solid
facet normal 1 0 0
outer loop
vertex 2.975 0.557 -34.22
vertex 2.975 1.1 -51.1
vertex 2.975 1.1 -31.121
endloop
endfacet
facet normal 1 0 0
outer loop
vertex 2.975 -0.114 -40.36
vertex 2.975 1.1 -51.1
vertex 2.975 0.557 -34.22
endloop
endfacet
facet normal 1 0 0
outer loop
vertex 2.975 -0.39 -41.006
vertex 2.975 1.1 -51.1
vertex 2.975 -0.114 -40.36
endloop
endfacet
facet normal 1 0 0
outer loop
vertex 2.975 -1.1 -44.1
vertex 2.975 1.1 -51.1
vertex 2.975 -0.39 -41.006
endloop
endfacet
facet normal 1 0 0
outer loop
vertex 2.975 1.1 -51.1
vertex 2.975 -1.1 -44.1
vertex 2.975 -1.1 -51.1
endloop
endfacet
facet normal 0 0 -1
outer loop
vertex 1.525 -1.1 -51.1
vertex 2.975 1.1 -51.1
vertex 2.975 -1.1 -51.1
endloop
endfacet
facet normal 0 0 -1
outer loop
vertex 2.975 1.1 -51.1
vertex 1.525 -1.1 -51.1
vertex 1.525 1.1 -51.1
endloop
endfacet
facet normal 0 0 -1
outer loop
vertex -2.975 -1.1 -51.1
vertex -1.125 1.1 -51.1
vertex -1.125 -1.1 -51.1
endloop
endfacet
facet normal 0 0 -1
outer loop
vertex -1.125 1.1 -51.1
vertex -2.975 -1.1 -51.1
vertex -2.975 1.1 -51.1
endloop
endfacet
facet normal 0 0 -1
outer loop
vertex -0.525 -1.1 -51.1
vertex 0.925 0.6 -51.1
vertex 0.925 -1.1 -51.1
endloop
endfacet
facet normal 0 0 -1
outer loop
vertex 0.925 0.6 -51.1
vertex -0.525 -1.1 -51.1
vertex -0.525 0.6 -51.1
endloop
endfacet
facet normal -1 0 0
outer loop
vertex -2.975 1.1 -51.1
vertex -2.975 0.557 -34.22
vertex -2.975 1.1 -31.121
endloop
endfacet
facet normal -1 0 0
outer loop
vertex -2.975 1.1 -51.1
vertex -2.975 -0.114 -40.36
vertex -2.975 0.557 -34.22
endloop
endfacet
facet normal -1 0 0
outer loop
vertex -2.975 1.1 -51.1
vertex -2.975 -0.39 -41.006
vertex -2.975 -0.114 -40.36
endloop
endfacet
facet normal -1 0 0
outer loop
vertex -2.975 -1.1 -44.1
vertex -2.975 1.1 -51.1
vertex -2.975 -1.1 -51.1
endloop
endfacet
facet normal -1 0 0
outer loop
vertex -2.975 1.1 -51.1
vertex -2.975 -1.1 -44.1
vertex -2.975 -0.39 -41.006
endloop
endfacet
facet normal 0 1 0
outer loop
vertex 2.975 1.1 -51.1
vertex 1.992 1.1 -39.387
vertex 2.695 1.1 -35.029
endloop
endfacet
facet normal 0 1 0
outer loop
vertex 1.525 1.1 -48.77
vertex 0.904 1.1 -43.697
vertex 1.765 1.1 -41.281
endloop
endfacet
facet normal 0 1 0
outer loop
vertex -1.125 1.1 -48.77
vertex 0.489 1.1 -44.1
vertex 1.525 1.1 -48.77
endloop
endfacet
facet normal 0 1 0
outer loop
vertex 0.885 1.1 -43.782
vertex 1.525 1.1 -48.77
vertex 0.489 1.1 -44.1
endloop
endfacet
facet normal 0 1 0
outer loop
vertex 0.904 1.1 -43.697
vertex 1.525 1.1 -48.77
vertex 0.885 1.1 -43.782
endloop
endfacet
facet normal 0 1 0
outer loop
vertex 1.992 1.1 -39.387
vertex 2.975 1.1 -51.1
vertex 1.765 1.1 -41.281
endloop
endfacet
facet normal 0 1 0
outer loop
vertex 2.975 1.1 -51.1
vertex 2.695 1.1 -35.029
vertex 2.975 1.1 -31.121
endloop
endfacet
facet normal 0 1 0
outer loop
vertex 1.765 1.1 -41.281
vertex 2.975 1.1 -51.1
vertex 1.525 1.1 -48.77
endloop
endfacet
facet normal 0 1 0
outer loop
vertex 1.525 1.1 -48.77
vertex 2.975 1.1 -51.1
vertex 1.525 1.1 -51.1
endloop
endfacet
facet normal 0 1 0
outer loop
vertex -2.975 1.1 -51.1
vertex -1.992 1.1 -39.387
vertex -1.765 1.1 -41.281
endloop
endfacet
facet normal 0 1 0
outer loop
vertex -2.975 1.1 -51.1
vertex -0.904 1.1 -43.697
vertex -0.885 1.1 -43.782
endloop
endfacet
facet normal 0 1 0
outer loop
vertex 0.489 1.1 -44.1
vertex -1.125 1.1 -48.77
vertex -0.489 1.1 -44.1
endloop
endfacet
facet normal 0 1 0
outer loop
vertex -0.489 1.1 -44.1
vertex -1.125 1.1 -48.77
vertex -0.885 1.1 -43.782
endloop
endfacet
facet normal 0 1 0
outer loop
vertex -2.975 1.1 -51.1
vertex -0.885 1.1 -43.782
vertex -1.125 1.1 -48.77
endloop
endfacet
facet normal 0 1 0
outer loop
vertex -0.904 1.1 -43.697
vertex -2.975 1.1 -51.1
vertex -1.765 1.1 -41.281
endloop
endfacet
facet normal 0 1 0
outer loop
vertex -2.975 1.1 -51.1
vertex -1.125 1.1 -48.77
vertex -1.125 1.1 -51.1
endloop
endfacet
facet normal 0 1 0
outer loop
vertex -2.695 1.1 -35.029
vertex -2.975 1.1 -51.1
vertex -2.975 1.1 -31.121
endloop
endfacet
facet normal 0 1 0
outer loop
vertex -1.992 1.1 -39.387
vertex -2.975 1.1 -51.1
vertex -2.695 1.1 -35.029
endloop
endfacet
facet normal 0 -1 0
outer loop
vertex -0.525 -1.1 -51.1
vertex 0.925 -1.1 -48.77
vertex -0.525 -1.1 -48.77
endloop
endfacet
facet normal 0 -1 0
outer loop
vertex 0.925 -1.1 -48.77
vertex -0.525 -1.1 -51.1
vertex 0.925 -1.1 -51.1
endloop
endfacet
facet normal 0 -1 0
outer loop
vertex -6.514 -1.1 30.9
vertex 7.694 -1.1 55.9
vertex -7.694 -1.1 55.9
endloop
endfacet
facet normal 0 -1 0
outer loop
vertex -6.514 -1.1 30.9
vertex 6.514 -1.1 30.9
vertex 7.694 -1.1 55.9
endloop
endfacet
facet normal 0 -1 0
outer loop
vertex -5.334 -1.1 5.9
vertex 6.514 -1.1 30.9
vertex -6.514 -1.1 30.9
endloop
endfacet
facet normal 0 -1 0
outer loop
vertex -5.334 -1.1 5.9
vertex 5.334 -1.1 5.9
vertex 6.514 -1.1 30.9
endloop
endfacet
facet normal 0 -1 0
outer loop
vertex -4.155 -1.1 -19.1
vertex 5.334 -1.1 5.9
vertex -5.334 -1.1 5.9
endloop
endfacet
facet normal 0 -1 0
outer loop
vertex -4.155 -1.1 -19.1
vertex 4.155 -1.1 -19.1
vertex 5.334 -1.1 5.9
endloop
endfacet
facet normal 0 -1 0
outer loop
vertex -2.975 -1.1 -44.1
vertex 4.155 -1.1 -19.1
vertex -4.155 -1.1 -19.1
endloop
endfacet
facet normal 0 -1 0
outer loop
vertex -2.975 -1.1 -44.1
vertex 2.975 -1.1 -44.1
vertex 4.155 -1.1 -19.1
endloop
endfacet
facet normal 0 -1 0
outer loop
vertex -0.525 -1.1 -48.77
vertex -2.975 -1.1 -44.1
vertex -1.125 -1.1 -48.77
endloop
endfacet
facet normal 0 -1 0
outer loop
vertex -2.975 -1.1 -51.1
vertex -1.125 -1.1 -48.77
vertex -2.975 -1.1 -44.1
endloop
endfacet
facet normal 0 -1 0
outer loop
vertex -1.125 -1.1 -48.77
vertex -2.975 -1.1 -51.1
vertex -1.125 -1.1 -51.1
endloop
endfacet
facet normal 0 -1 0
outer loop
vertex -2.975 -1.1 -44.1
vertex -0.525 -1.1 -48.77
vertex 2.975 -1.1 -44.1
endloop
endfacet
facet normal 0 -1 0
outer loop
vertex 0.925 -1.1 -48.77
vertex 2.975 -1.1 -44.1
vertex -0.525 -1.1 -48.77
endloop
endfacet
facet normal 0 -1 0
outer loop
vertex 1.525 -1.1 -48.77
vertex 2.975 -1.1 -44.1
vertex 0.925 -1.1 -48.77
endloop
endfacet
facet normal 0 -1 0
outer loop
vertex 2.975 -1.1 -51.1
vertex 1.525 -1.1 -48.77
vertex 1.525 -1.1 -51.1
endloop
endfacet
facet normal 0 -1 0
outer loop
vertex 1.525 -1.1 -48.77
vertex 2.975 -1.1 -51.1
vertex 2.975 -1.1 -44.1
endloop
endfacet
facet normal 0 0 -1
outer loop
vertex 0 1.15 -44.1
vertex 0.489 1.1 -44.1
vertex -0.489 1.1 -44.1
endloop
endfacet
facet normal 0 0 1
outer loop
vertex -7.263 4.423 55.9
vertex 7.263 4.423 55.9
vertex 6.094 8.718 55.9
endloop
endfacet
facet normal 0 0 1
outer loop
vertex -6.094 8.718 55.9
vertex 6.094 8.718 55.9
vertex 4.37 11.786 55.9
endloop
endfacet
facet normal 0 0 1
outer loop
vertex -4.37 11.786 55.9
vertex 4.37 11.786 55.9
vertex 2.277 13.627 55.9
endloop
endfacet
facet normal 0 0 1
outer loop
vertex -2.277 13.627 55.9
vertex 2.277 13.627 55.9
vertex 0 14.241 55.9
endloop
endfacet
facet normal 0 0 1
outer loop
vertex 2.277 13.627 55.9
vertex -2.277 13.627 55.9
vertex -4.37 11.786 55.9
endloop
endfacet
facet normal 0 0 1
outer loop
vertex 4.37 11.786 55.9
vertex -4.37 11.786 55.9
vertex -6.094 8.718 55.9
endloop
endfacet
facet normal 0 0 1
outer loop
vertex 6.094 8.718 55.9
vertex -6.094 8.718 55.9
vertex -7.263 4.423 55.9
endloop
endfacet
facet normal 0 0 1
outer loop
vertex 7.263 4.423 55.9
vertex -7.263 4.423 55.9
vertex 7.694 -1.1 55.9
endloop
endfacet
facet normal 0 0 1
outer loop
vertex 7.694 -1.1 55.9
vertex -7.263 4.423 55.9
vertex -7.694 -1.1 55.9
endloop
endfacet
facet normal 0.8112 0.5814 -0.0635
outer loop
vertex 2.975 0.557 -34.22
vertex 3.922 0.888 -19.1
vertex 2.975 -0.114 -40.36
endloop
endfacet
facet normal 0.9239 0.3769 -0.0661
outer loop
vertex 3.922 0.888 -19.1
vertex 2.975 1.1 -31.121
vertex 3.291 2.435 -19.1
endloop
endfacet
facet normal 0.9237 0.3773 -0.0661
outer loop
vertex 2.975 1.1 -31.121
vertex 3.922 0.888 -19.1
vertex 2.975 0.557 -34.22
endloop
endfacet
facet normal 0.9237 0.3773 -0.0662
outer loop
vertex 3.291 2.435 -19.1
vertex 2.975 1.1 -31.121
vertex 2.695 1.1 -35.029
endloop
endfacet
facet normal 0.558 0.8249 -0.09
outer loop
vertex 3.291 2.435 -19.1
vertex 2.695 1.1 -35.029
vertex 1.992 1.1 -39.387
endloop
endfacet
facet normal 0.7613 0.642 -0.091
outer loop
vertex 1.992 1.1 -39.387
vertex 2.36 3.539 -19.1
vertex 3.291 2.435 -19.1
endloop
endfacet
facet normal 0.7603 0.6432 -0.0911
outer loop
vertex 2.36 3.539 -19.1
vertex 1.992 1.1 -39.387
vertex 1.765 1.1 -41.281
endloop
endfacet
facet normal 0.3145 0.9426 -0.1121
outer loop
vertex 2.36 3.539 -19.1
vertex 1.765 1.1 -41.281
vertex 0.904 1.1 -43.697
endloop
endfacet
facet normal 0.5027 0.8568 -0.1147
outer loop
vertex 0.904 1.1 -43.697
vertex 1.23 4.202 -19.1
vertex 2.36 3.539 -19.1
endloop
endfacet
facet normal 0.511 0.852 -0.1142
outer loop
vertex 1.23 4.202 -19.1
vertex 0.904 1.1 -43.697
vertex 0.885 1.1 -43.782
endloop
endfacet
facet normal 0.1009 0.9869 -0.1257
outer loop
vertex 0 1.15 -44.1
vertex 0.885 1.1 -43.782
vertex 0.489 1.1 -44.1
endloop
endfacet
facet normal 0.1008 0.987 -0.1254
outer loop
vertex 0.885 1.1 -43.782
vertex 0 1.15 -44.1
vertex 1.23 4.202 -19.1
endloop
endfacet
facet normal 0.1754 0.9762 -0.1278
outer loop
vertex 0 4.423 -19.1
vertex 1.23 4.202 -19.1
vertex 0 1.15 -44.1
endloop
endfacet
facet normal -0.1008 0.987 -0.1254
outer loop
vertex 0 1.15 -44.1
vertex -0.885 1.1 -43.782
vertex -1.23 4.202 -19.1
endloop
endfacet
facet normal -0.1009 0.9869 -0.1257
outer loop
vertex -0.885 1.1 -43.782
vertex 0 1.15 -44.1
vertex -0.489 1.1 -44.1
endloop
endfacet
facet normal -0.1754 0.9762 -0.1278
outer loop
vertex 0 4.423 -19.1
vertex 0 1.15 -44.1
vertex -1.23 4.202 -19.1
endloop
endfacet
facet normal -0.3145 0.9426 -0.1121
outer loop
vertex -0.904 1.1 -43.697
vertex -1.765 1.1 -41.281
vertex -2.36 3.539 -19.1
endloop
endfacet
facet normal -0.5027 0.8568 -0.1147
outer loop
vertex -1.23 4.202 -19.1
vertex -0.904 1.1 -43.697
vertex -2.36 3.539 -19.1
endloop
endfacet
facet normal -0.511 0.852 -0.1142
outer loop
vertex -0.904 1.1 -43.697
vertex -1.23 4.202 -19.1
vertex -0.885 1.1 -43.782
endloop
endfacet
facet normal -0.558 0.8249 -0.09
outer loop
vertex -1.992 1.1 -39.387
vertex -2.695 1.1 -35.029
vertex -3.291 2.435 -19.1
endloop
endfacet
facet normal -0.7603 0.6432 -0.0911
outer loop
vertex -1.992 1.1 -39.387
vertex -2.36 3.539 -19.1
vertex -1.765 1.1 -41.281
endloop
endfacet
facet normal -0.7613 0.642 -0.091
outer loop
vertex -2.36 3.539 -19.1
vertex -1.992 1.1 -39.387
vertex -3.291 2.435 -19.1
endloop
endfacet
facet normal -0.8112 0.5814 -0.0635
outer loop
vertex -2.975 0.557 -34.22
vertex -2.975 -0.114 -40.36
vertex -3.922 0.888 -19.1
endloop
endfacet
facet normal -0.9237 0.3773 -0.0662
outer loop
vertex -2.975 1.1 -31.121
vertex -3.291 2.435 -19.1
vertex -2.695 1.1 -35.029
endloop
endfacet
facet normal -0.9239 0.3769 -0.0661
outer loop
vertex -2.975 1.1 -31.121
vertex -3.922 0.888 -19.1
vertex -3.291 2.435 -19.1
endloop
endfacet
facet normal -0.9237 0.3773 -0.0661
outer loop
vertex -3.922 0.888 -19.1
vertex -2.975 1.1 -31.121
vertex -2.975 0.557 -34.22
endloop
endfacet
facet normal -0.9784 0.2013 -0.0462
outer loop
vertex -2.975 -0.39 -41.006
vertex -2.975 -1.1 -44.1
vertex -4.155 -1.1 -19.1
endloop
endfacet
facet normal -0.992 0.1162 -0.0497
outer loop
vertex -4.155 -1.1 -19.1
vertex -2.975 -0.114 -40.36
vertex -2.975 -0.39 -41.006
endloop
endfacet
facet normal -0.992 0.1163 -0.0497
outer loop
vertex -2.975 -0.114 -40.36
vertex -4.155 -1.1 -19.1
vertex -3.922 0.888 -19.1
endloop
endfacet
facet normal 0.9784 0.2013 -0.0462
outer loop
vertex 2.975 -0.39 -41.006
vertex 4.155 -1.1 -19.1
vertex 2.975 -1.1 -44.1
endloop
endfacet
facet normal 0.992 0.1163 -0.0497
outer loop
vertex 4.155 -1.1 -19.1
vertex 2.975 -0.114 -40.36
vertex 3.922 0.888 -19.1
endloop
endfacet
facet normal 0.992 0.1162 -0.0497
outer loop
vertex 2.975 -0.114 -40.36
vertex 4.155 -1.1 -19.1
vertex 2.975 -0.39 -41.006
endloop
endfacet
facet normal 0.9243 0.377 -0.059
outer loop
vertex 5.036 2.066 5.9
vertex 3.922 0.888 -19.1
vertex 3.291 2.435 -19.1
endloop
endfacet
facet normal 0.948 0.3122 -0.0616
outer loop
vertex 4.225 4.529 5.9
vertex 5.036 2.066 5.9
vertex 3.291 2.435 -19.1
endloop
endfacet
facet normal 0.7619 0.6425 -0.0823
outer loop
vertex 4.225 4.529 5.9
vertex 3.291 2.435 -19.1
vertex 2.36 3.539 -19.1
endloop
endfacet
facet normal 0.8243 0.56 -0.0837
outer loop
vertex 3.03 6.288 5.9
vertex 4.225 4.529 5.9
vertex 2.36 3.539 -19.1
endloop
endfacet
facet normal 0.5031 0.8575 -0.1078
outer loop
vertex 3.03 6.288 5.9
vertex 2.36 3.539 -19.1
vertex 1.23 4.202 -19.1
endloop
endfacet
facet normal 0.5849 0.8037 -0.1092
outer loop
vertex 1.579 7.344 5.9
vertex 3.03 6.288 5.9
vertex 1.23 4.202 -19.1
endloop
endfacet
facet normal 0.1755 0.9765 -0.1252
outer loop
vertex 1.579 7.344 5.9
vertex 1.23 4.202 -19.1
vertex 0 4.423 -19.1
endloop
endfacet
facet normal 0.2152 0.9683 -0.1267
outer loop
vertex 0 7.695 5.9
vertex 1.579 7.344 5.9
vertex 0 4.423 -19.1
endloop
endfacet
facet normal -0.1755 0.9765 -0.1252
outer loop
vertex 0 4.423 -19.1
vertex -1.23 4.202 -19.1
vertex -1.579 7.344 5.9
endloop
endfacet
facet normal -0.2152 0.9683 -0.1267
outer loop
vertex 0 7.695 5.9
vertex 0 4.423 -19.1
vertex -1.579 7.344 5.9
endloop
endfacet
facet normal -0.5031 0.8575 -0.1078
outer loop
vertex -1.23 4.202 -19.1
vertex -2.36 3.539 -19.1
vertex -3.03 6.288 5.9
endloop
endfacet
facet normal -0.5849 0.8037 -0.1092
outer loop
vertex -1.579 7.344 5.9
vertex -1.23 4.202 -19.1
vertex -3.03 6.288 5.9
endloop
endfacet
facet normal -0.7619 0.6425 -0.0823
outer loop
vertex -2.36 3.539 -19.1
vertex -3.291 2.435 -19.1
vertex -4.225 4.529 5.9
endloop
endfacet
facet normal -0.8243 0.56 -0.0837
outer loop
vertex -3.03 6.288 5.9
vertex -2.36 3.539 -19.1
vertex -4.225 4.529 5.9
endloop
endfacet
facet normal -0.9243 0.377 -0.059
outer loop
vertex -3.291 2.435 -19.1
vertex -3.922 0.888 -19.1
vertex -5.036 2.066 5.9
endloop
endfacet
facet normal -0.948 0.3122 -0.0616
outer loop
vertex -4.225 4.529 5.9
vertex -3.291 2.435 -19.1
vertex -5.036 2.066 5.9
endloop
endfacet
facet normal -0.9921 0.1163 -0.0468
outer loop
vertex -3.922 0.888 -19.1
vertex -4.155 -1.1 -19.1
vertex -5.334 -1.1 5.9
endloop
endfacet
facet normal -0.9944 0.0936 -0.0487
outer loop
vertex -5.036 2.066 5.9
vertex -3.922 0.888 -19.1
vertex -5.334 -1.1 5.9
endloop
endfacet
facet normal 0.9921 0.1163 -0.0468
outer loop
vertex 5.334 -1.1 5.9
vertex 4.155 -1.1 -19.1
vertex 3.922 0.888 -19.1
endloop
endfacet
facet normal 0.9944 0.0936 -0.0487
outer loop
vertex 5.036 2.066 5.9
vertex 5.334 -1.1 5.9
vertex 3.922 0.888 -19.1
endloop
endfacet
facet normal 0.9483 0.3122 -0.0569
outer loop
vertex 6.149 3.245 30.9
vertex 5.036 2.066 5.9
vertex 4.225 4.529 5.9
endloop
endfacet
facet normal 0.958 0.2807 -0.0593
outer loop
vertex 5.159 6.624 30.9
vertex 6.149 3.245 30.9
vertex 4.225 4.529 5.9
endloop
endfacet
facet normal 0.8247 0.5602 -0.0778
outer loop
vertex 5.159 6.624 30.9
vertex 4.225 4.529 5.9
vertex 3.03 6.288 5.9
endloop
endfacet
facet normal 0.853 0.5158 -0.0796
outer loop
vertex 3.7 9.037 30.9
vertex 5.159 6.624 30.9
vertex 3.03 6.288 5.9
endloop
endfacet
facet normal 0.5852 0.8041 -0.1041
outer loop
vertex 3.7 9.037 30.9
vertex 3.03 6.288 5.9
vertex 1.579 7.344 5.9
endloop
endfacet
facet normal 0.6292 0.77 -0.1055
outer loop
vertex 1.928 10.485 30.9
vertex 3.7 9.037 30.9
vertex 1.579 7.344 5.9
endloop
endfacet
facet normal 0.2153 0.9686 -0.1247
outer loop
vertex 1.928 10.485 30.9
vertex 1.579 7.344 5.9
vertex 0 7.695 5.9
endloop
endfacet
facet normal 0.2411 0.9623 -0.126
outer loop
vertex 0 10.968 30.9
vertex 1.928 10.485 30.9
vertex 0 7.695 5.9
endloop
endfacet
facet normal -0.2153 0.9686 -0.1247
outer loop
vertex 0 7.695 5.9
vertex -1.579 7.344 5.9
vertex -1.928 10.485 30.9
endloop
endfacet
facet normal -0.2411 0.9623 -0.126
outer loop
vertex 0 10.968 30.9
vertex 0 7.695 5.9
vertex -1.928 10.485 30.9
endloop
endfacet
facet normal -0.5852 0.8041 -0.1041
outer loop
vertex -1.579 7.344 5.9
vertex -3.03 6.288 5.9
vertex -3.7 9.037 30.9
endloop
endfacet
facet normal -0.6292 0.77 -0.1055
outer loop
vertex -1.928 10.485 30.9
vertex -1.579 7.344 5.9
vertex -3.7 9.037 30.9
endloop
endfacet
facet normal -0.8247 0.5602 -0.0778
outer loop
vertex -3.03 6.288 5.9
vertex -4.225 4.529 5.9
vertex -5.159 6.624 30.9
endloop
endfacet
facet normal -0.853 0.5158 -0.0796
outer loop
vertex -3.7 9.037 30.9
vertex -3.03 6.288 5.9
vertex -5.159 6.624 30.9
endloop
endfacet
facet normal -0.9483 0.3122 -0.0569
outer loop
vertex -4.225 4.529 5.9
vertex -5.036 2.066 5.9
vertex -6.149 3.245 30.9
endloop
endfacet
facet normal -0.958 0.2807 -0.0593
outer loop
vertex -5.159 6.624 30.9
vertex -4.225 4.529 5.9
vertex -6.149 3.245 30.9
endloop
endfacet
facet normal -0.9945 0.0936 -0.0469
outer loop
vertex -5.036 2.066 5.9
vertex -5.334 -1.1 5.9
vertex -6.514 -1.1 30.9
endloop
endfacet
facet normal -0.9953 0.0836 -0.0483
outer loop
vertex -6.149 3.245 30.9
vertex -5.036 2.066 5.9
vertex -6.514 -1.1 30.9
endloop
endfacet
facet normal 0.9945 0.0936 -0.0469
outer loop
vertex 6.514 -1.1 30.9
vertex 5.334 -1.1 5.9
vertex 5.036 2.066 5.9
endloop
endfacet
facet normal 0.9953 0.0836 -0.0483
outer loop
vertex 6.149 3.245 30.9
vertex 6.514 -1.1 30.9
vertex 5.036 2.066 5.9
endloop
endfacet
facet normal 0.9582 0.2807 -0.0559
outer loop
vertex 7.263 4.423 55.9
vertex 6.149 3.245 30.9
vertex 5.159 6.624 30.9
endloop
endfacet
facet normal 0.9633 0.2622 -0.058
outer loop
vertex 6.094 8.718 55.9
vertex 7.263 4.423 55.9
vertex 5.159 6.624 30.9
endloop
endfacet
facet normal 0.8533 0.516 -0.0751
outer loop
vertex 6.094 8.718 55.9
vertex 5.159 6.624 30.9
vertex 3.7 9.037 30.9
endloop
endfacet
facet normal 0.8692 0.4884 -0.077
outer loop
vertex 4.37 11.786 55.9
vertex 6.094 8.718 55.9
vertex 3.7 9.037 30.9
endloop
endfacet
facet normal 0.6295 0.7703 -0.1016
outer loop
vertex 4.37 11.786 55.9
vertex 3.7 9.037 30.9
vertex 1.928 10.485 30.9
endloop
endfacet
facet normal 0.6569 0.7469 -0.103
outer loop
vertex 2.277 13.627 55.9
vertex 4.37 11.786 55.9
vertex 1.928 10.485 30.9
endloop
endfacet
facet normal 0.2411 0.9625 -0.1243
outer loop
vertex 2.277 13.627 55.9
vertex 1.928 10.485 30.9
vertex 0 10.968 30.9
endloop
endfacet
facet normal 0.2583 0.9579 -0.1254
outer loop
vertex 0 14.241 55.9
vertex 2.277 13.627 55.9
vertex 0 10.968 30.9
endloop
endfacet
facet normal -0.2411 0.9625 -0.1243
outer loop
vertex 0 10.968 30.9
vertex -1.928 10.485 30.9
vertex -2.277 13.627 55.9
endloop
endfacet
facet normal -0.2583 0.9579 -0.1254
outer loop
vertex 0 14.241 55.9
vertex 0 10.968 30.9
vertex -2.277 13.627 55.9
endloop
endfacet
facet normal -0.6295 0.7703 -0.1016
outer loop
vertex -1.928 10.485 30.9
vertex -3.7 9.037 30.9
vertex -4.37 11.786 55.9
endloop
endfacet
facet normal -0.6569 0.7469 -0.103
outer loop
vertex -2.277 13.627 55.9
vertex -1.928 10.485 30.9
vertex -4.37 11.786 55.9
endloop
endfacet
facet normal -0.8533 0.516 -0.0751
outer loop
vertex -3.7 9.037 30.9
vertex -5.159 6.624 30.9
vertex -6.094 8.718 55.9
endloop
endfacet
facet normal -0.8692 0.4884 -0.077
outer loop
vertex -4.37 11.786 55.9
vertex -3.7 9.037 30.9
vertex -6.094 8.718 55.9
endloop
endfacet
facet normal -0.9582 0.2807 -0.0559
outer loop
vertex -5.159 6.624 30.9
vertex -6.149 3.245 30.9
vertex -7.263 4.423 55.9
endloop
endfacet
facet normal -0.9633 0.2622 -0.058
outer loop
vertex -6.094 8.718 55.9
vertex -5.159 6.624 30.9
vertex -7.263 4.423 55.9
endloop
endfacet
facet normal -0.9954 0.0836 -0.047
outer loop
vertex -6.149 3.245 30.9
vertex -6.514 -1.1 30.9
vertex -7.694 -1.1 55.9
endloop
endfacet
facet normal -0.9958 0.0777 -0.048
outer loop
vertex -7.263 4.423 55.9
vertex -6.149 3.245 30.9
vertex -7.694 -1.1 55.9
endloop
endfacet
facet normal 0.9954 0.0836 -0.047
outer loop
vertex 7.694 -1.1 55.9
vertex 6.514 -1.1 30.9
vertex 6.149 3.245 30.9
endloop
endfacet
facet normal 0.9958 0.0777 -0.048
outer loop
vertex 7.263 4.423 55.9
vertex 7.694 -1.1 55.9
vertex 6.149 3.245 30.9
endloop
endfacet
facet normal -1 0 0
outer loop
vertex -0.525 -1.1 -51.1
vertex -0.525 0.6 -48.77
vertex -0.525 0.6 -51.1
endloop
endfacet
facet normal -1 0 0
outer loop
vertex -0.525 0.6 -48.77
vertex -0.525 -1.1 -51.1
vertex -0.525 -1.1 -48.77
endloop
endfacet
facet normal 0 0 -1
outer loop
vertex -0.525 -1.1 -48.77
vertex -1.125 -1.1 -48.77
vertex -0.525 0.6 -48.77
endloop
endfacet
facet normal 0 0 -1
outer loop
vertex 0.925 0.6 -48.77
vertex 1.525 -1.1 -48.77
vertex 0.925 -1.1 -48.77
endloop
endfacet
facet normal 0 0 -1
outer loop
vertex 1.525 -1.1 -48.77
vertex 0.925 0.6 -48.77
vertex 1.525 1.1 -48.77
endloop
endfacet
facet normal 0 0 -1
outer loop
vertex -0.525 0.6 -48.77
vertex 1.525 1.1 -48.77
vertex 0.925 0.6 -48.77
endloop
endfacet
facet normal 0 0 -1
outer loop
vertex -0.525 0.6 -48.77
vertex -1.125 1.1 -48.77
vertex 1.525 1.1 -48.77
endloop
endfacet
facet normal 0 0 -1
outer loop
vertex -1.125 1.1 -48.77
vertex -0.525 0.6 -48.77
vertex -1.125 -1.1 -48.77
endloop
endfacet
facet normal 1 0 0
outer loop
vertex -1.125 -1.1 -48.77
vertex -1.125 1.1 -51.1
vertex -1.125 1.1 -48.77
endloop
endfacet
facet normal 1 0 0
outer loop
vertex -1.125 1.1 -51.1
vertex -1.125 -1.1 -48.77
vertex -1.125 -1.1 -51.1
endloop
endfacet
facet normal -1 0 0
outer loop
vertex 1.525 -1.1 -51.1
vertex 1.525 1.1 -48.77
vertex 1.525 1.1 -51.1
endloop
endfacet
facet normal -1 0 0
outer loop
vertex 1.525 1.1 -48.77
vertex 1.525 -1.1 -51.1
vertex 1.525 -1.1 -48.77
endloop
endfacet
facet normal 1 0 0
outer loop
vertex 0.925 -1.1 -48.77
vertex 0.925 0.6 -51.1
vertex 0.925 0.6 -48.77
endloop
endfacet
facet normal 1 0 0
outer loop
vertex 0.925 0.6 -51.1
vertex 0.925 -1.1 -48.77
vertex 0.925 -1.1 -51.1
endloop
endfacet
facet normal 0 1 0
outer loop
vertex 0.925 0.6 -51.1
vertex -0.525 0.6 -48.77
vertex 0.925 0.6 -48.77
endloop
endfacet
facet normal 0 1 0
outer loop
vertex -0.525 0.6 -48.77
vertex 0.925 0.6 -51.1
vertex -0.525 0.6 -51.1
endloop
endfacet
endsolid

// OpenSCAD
// Start: lazy_union
default_5_default_5();
// End: lazy_union

// Modules.

// 'PartMaterial undef-default - default 5.0'
module default_5_default_5() {
  // 'None : _combine_solids_and_holes'
  union() {
    // '_combine_solids_and_holes'
    difference() {
      // 'default : _combine_solids_and_holes'
      union() {
        // 'box'
        multmatrix(m=[[1.0, 0.0, 0.0, -2.975], [0.0, 1.0, 0.0, -1.1], [0.0, 0.0, 1.0, -51.1], [0.0, 0.0, 0.0, 1.0]]) {
          // 'box : _combine_solids_and_holes'
          union() {
            // 'box'
            cube(size=[5.95, 2.2, 102.2]);
          }
        }
        // 'handle'
        multmatrix(m=[[1.0, 0.0, 0.0, 0.0], [0.0, 1.0, 0.0, -1.1], [0.0, 0.0, 1.0, -44.1], [0.0, 0.0, 0.0, 1.0]]) {
          // 'handle : _combine_solids_and_holes'
          union() {
            // 'handle'
            linear_extrude(height=100.0, twist=0.0, slices=4, scale=[2.586206896551724, 6.8181818181818175]) {
              polygon(points=[[0.0, 0.0], [-0.7437499999999999, 0.0], [-1.4875, 0.0], [-2.23125, 0.0], [-2.975, 0.0], [-2.8084, 0.81], [-2.3562, 1.44], [-1.6897999999999997, 1.8899999999999997], [-0.8805999999999994, 2.1599999999999997], [4.440892098500626e-16, 2.25], [0.8806000000000003, 2.1599999999999997], [1.6898000000000004, 1.8900000000000006], [2.3562000000000016, 1.4399999999999986], [2.808400000000002, 0.8099999999999987], [2.975000000000001, 0.0], [2.23125, 0.0], [1.4875, 0.0], [0.74375, 0.0]]);
            }
          }
        }
      }
      // 'default'
      multmatrix(m=[[1.0, 0.0, 0.0, -1.125], [0.0, 1.0, 0.0, -1.1], [0.0, 0.0, 1.0, -51.1], [0.0, 0.0, 0.0, 1.0]]) {
        // ('slit', 0)
        color(c=[1.0, 0.0, 0.0, 0.3]) {
          // "('slit', 0) : _combine_solids_and_holes"
          union() {
            // ('slit', 0)
            cube(size=[0.6, 2.2, 2.33]);
          }
        }
      }
      // 'default'
      multmatrix(m=[[1.0, 0.0, 0.0, 0.9249999999999998], [0.0, 1.0, 0.0, -1.1], [0.0, 0.0, 1.0, -51.1], [0.0, 0.0, 0.0, 1.0]]) {
        // ('slit', 1)
        color(c=[1.0, 0.0, 0.0, 0.6]) {
          // "('slit', 1) : _combine_solids_and_holes"
          union() {
            // ('slit', 1)
            cube(size=[0.6, 2.2, 2.33]);
          }
        }
      }
      // 'default'
      multmatrix(m=[[1.0, 0.0, 0.0, -1.125], [0.0, -1.0, 0.0, 1.1], [0.0, 0.0, -1.0, -48.77], [0.0, 0.0, 0.0, 1.0]]) {
        // 'notch : _combine_solids_and_holes'
        union() {
          // 'notch'
          cube(size=[2.05, 0.5, 7.0]);
        }
      }
    }
  }
} // end module default_5_default_5
